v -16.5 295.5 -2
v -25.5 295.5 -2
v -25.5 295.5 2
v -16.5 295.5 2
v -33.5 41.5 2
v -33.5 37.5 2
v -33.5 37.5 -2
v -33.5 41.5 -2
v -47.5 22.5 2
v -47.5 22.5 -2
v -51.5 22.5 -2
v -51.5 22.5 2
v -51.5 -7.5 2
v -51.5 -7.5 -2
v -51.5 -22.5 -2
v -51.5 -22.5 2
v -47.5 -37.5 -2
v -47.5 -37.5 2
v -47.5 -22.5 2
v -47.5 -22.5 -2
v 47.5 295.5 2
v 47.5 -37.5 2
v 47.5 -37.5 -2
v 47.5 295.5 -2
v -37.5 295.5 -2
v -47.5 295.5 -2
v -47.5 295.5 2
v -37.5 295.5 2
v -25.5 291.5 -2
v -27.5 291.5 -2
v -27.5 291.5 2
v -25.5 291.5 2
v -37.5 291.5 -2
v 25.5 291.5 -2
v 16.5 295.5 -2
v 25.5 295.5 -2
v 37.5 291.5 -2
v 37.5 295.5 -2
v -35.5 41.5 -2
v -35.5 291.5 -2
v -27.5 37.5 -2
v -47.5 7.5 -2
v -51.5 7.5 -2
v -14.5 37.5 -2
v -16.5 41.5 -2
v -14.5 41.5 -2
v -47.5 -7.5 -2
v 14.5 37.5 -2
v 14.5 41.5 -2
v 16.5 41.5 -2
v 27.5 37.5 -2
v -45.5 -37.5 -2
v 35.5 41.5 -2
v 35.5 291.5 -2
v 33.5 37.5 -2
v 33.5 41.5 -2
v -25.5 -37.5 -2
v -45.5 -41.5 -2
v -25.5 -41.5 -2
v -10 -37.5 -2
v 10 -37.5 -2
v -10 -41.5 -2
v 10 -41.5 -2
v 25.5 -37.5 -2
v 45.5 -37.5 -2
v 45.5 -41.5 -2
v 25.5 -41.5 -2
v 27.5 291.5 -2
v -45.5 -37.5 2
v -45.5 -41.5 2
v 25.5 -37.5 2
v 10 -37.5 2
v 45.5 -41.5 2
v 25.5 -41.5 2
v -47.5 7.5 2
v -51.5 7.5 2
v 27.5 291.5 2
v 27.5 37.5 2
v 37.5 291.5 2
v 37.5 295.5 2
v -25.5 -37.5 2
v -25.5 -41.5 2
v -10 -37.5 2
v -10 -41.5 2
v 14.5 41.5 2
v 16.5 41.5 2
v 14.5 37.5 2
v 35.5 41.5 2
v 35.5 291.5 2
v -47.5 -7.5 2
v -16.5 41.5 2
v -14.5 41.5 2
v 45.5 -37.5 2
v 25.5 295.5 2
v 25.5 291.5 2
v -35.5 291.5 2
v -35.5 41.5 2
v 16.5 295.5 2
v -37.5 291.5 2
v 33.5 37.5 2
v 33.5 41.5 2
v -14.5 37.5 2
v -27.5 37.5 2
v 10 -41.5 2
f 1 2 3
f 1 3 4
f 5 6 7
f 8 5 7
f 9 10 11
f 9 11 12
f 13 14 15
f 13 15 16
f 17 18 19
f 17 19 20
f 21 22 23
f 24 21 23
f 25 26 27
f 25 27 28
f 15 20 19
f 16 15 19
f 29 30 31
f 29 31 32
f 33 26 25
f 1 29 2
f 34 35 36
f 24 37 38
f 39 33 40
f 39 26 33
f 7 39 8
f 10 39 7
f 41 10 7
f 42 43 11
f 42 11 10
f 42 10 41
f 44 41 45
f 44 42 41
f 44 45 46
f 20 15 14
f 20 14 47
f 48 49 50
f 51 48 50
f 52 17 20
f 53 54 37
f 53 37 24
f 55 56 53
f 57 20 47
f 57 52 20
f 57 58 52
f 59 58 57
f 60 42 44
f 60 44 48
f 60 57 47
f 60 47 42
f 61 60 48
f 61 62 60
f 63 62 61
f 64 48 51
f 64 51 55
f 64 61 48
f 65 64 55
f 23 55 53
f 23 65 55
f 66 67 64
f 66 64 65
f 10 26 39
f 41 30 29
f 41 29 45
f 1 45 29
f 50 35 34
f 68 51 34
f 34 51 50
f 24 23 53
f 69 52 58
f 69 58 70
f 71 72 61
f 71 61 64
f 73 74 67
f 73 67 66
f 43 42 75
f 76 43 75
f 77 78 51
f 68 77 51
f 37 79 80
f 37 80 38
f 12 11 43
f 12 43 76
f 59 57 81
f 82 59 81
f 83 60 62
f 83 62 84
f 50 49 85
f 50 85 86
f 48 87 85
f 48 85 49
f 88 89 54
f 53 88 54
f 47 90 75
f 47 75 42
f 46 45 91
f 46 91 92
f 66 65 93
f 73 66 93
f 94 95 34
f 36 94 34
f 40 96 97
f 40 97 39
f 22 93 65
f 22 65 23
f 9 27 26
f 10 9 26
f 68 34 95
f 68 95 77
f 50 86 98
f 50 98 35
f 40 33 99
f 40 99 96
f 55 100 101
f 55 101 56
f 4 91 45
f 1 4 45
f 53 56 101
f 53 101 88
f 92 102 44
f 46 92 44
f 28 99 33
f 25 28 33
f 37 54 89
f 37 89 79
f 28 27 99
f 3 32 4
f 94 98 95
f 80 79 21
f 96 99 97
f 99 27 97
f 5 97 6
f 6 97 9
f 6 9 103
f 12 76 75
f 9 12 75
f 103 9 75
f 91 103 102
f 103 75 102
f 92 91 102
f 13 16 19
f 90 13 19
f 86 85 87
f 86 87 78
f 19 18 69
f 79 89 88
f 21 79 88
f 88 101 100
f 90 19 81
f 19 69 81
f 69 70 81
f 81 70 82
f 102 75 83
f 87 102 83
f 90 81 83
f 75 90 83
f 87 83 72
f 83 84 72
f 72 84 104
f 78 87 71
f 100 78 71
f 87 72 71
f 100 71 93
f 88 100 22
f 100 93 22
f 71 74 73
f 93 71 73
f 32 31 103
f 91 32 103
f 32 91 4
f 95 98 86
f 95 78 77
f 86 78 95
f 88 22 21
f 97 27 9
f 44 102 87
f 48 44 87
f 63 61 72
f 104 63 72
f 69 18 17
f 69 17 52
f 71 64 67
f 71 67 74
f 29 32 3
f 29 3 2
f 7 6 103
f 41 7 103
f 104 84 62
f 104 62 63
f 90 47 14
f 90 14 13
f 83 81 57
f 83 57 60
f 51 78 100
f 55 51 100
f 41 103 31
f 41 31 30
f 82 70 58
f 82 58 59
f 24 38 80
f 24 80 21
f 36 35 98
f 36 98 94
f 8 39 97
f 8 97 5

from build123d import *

# Parameters (mm, degrees)
SKETCH1_W           = 95
SKETCH1_H           = 75
BOSS_EXTRUDE1_DEPTH = 2
SKETCH2_W           = 14
SKETCH2_H           = 4
SKETCH2_W_2         = 13
BOSS_EXTRUDE2_DEPTH = 4
SKETCH3_W           = 12
SKETCH3_H           = 4
SKETCH3_W_2         = 11
BOSS_EXTRUDE3_DEPTH = 250
SKETCH4_W           = 10
SKETCH4_H           = 4
SKETCH4_W_2         = 9
BOSS_EXTRUDE4_DEPTH = 4
SKETCH5_W           = 4
SKETCH5_H           = 15
BOSS_EXTRUDE5_DEPTH = 4
SKETCH6_W           = 20
SKETCH6_H           = 4
BOSS_EXTRUDE6_DEPTH = 4


with BuildPart() as part:
    # Sketch1 → Boss-Extrude1 (new, symmetric)
    with BuildSketch(Plane.XY):
        Rectangle(SKETCH1_W, SKETCH1_H)
    extrude(amount=BOSS_EXTRUDE1_DEPTH, both=True)

    # Sketch2 → Boss-Extrude2 (add)
    with BuildSketch(Plane(origin=(0, 37.5, 0), x_dir=(1, 0, 0), z_dir=(0, 1, 0))):
        with Locations((40.5, 0)):
            Rectangle(SKETCH2_W, SKETCH2_H)
        with Locations((21, 0)):
            Rectangle(SKETCH2_W_2, SKETCH2_H)
        with Locations((-40.5, 0)):
            Rectangle(SKETCH2_W, SKETCH2_H)
        with Locations((-21, 0)):
            Rectangle(SKETCH2_W_2, SKETCH2_H)
    extrude(amount=BOSS_EXTRUDE2_DEPTH)

    # Sketch3 → Boss-Extrude3 (add)
    with BuildSketch(Plane(origin=(0, 41.5, 0), x_dir=(1, 0, 0), z_dir=(0, 1, 0))):
        with Locations((41.5, 0)):
            Rectangle(SKETCH3_W, SKETCH3_H)
        with Locations((22, 0)):
            Rectangle(SKETCH3_W_2, SKETCH3_H)
        with Locations((-22, 0)):
            Rectangle(SKETCH3_W_2, SKETCH3_H)
        with Locations((-41.5, 0)):
            Rectangle(SKETCH3_W, SKETCH3_H)
    extrude(amount=BOSS_EXTRUDE3_DEPTH)

    # Sketch4 → Boss-Extrude4 (add)
    with BuildSketch(Plane(origin=(0, 291.5, 0), x_dir=(1, 0, 0), z_dir=(0, 1, 0))):
        with Locations((-42.5, 0)):
            Rectangle(SKETCH4_W, SKETCH4_H)
        with Locations((-21, 0)):
            Rectangle(SKETCH4_W_2, SKETCH4_H)
        with Locations((21, 0)):
            Rectangle(SKETCH4_W_2, SKETCH4_H)
        with Locations((42.5, 0)):
            Rectangle(SKETCH4_W, SKETCH4_H)
    extrude(amount=BOSS_EXTRUDE4_DEPTH)

    # Sketch5 → Boss-Extrude5 (add)
    with BuildSketch(Plane.ZY.offset(47.5)):
        with Locations((0, -15)):
            Rectangle(SKETCH5_W, SKETCH5_H)
        with Locations((0, 15)):
            Rectangle(SKETCH5_W, SKETCH5_H)
    extrude(amount=BOSS_EXTRUDE5_DEPTH)

    # Sketch6 → Boss-Extrude6 (add)
    with BuildSketch(Plane.XZ.offset(37.5)):
        with Locations((-35.5, 0)):
            Rectangle(SKETCH6_W, SKETCH6_H)
        with Locations((35.5, 0)):
            Rectangle(SKETCH6_W, SKETCH6_H)
        Rectangle(SKETCH6_W, SKETCH6_H)
    extrude(amount=BOSS_EXTRUDE6_DEPTH)


solid = part.part
